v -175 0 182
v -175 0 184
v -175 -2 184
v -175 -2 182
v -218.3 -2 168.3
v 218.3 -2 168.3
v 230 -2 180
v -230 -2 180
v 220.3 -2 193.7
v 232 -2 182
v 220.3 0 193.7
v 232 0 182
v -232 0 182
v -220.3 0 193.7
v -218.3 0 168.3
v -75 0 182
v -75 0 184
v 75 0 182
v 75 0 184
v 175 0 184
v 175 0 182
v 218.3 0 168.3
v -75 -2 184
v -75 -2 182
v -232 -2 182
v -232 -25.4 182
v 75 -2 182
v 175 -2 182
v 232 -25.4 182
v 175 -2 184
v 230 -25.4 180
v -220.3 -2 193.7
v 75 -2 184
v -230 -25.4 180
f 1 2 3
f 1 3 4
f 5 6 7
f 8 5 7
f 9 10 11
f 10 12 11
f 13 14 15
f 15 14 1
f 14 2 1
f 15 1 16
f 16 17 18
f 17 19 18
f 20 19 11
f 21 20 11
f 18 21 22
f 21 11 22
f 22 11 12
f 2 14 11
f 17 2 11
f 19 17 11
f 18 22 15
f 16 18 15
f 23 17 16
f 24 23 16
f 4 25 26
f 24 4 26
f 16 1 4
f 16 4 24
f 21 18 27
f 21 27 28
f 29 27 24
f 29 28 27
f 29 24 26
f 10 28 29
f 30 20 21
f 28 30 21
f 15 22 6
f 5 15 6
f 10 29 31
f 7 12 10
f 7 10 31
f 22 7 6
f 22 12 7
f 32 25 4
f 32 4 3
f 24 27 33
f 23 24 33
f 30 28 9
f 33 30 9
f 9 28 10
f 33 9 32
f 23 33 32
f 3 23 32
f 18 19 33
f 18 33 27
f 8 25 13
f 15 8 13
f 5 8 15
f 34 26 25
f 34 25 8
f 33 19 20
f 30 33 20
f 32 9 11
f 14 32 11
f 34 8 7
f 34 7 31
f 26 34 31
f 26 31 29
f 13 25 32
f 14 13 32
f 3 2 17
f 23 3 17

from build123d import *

# Parameters (mm, degrees)
RESSALTO_EXTRUS_O1_DEPTH = 232
CORTE_EXTRUS_O1_DEPTH    = 50
ESBO_O3_W                = 100
ESBO_O3_H                = 2
CORTE_EXTRUS_O2_DEPTH    = 304.296636974
CORTE_EXTRUS_O3_DEPTH    = 50


with BuildPart() as part:
    # Esboço1 → Ressalto-extrusão1 (new, symmetric)
    with BuildSketch(Plane(origin=(0, 0, 0), x_dir=(0, 0, -1), z_dir=(1, 0, 0))):
        Polygon((-193.7, 0), (-168.3, 0), (-168.3, -2), (-180, -2), (-180, -25.4), (-182, -25.4), (-182, -2), (-193.7, -2), align=None)
    extrude(amount=RESSALTO_EXTRUS_O1_DEPTH, both=True)

    # Esboço2 → Corte-extrusão1 (cut, symmetric)
    with BuildSketch(Plane(origin=(0, 0, 0), x_dir=(1, 0, 0), z_dir=(0, 1, 0))):
        Polygon((-232, -182), (-218.3, -168.3), (-232, -168.3), align=None)
        Polygon((232, -182), (218.3, -168.3), (232, -168.3), align=None)
    extrude(amount=CORTE_EXTRUS_O1_DEPTH, both=True, mode=Mode.SUBTRACT)

    # Esboço3 → Corte-extrusão2 (cut, through all)
    with BuildSketch(Plane(origin=(0, 0, 0), x_dir=(1, 0, 0), z_dir=(0, 1, 0))):
        with Locations((-125, -183)):
            Rectangle(ESBO_O3_W, ESBO_O3_H)
        with Locations((125, -183)):
            Rectangle(ESBO_O3_W, ESBO_O3_H)
    extrude(amount=-CORTE_EXTRUS_O2_DEPTH, mode=Mode.SUBTRACT)

    # Esboço4 → Corte-extrusão3 (cut, symmetric)
    with BuildSketch(Plane(origin=(0, 0, 0), x_dir=(1, 0, 0), z_dir=(0, 1, 0))):
        Polygon((-232, -182), (-220.3, -193.7), (-232, -193.7), align=None)
        Polygon((232, -182), (220.3, -193.7), (232, -193.7), align=None)
    extrude(amount=CORTE_EXTRUS_O3_DEPTH, both=True, mode=Mode.SUBTRACT)


solid = part.part
